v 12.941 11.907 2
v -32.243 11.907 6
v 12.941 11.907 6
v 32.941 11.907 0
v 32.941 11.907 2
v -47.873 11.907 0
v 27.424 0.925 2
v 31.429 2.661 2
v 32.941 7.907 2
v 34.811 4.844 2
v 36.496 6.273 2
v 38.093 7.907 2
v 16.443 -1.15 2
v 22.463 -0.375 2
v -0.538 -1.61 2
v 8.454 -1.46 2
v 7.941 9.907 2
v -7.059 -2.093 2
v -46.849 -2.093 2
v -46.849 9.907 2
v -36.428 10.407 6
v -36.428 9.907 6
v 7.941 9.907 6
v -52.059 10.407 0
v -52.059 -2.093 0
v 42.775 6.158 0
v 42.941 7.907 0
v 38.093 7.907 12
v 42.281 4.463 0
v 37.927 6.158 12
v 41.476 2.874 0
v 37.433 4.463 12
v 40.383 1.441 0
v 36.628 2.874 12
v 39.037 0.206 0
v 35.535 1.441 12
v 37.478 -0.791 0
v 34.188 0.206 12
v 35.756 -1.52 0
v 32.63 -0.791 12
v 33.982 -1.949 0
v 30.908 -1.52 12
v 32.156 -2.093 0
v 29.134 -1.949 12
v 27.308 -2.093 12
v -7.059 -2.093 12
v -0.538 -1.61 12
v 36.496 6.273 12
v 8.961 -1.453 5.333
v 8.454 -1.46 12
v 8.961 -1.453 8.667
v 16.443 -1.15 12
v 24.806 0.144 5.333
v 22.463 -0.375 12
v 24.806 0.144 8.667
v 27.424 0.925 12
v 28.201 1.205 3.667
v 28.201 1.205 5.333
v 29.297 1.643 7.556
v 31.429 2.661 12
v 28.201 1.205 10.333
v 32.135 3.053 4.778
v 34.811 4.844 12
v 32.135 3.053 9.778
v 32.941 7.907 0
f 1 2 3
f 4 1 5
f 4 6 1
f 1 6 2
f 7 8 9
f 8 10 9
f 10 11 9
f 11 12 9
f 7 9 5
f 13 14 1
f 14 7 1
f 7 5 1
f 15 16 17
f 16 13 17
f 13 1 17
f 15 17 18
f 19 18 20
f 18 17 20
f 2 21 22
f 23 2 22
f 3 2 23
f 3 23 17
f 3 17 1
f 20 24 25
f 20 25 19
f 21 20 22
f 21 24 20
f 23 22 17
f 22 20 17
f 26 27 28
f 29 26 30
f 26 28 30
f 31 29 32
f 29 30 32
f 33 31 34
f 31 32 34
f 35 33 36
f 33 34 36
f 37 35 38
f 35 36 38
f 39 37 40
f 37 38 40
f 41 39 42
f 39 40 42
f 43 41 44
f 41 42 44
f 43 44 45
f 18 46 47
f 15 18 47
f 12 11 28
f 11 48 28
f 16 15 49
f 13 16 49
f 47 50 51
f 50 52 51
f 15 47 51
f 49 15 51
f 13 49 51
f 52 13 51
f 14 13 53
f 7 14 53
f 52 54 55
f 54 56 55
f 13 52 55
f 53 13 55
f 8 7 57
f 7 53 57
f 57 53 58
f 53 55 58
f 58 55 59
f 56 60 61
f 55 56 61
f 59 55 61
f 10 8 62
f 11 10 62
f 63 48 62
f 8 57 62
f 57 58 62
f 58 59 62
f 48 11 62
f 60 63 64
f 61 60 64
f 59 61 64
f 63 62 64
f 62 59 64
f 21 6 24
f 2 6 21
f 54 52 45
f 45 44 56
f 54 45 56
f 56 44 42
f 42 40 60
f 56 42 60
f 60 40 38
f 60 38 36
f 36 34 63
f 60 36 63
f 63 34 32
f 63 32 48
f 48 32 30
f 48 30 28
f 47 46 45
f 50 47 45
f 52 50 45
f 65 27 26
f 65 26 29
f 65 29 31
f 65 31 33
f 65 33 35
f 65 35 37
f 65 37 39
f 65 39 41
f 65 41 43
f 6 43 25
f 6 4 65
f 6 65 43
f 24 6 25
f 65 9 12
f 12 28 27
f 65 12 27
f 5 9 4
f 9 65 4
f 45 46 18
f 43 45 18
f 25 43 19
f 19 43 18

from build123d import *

# Parameters (mm, degrees)
SKETCH1_W           = 85
SKETCH1_H           = 14
BOSS_EXTRUDE1_DEPTH = 2
SKETCH2_W           = 85
SKETCH2_H           = 2
BOSS_EXTRUDE2_DEPTH = 6
SKETCH3_W           = 10
SKETCH3_H           = 10
BOSS_EXTRUDE3_DEPTH = 2
CUT_EXTRUDE1_DEPTH  = 4
CUT_EXTRUDE2_DEPTH  = 20
CHAMFER1_SIZE       = 1.5
SKETCH6_W           = 10
SKETCH6_H           = 10
BOSS_EXTRUDE4_DEPTH = 50
CUT_EXTRUDE3_DEPTH  = 50
FILLET1_R           = 10
CUT_EXTRUDE4_DEPTH  = 10


with BuildPart() as part:
    # Sketch1 → Boss-Extrude1 (new body)
    with BuildSketch(Plane.XY):
        with Locations((-9.558823529, 4.906862745)):
            Rectangle(SKETCH1_W, SKETCH1_H)
    extrude(amount=BOSS_EXTRUDE1_DEPTH)

    # Sketch2 → Boss-Extrude2 (add)
    with BuildSketch(Plane.XY):
        with Locations((-9.558823529, 10.906862745)):
            Rectangle(SKETCH2_W, SKETCH2_H)
    extrude(amount=BOSS_EXTRUDE2_DEPTH)

    # Sketch3 → Boss-Extrude3 (add)
    with BuildSketch(Plane(origin=(0, 0, 0), x_dir=(-1, 0, 0), z_dir=(0, 0, -1))):
        with Locations((-37.941176471, 2.906862745)):
            Rectangle(SKETCH3_W, SKETCH3_H)
    extrude(amount=-BOSS_EXTRUDE3_DEPTH)

    # Sketch4 → Cut-Extrude1 (cut)
    with BuildSketch(Plane.XY.offset(6)):
        Polygon((7.941176471, 9.906862745), (12.941176471, 11.906862745), (32.941176471, 11.906862745), (32.941176471, 9.906862745), align=None)
    extrude(amount=-CUT_EXTRUDE1_DEPTH, mode=Mode.SUBTRACT)

    # Sketch5 → Cut-Extrude2 (cut)
    with BuildSketch(Plane(origin=(0, 11.906862745, 0), x_dir=(1, 0, 0), z_dir=(0, 1, 0))):
        Polygon((-52.058823529, 0), (-36.428289141, -6), (-52.058823529, -6), align=None)
    extrude(amount=-CUT_EXTRUDE2_DEPTH, mode=Mode.SUBTRACT)

    # Chamfer1
    chamfer1_edges = [part.edges().sort_by_distance(p)[0] for p in [
        (-44.243556335, 11.906862745, 3),
    ]]
    chamfer(chamfer1_edges, length=CHAMFER1_SIZE)

    # Sketch6 → Boss-Extrude4 (add)
    with BuildSketch(Plane(origin=(42.941176471, 0, 0), x_dir=(0, 0, -1), z_dir=(1, 0, 0))):
        with Locations((-7, 2.906862745)):
            Rectangle(SKETCH6_W, SKETCH6_H)
    extrude(amount=-BOSS_EXTRUDE4_DEPTH)

    # Sketch7 → Cut-Extrude3 (cut)
    with BuildSketch(Plane.XZ.offset(2.093137255)):
        Polygon((42.941176471, 0), (38.092861761, 12), (42.941176471, 12), align=None)
    extrude(amount=-CUT_EXTRUDE3_DEPTH, mode=Mode.SUBTRACT)

    # Fillet1
    fillet1_edges = [part.edges().sort_by_distance(p)[0] for p in [
        (40.517019116, -2.093137255, 6),
    ]]
    fillet(fillet1_edges, radius=FILLET1_R - 0.0001)  # a hair under: the kernel refuses the full size

    # Sketch8 → Cut-Extrude4 (cut)
    with BuildSketch(Plane.XY.offset(12)):
        with BuildLine():
            Line((-7.058823529, -2.093137255), (-7.058823529, 7.906862745))
            Line((-7.058823529, 7.906862745), (38.092861761, 7.906862745))
            add(Edge.make_bspline(
                [(-7.058823529, -2.093137255), (8.253894017, -0.195900436), (26.879326583, -4.673987429), (38.092861761, 7.906862745)],
                knots=[0, 0, 0, 0, 1, 1, 1, 1], degree=3))
        make_face()
    extrude(amount=-CUT_EXTRUDE4_DEPTH, mode=Mode.SUBTRACT)


solid = part.part
